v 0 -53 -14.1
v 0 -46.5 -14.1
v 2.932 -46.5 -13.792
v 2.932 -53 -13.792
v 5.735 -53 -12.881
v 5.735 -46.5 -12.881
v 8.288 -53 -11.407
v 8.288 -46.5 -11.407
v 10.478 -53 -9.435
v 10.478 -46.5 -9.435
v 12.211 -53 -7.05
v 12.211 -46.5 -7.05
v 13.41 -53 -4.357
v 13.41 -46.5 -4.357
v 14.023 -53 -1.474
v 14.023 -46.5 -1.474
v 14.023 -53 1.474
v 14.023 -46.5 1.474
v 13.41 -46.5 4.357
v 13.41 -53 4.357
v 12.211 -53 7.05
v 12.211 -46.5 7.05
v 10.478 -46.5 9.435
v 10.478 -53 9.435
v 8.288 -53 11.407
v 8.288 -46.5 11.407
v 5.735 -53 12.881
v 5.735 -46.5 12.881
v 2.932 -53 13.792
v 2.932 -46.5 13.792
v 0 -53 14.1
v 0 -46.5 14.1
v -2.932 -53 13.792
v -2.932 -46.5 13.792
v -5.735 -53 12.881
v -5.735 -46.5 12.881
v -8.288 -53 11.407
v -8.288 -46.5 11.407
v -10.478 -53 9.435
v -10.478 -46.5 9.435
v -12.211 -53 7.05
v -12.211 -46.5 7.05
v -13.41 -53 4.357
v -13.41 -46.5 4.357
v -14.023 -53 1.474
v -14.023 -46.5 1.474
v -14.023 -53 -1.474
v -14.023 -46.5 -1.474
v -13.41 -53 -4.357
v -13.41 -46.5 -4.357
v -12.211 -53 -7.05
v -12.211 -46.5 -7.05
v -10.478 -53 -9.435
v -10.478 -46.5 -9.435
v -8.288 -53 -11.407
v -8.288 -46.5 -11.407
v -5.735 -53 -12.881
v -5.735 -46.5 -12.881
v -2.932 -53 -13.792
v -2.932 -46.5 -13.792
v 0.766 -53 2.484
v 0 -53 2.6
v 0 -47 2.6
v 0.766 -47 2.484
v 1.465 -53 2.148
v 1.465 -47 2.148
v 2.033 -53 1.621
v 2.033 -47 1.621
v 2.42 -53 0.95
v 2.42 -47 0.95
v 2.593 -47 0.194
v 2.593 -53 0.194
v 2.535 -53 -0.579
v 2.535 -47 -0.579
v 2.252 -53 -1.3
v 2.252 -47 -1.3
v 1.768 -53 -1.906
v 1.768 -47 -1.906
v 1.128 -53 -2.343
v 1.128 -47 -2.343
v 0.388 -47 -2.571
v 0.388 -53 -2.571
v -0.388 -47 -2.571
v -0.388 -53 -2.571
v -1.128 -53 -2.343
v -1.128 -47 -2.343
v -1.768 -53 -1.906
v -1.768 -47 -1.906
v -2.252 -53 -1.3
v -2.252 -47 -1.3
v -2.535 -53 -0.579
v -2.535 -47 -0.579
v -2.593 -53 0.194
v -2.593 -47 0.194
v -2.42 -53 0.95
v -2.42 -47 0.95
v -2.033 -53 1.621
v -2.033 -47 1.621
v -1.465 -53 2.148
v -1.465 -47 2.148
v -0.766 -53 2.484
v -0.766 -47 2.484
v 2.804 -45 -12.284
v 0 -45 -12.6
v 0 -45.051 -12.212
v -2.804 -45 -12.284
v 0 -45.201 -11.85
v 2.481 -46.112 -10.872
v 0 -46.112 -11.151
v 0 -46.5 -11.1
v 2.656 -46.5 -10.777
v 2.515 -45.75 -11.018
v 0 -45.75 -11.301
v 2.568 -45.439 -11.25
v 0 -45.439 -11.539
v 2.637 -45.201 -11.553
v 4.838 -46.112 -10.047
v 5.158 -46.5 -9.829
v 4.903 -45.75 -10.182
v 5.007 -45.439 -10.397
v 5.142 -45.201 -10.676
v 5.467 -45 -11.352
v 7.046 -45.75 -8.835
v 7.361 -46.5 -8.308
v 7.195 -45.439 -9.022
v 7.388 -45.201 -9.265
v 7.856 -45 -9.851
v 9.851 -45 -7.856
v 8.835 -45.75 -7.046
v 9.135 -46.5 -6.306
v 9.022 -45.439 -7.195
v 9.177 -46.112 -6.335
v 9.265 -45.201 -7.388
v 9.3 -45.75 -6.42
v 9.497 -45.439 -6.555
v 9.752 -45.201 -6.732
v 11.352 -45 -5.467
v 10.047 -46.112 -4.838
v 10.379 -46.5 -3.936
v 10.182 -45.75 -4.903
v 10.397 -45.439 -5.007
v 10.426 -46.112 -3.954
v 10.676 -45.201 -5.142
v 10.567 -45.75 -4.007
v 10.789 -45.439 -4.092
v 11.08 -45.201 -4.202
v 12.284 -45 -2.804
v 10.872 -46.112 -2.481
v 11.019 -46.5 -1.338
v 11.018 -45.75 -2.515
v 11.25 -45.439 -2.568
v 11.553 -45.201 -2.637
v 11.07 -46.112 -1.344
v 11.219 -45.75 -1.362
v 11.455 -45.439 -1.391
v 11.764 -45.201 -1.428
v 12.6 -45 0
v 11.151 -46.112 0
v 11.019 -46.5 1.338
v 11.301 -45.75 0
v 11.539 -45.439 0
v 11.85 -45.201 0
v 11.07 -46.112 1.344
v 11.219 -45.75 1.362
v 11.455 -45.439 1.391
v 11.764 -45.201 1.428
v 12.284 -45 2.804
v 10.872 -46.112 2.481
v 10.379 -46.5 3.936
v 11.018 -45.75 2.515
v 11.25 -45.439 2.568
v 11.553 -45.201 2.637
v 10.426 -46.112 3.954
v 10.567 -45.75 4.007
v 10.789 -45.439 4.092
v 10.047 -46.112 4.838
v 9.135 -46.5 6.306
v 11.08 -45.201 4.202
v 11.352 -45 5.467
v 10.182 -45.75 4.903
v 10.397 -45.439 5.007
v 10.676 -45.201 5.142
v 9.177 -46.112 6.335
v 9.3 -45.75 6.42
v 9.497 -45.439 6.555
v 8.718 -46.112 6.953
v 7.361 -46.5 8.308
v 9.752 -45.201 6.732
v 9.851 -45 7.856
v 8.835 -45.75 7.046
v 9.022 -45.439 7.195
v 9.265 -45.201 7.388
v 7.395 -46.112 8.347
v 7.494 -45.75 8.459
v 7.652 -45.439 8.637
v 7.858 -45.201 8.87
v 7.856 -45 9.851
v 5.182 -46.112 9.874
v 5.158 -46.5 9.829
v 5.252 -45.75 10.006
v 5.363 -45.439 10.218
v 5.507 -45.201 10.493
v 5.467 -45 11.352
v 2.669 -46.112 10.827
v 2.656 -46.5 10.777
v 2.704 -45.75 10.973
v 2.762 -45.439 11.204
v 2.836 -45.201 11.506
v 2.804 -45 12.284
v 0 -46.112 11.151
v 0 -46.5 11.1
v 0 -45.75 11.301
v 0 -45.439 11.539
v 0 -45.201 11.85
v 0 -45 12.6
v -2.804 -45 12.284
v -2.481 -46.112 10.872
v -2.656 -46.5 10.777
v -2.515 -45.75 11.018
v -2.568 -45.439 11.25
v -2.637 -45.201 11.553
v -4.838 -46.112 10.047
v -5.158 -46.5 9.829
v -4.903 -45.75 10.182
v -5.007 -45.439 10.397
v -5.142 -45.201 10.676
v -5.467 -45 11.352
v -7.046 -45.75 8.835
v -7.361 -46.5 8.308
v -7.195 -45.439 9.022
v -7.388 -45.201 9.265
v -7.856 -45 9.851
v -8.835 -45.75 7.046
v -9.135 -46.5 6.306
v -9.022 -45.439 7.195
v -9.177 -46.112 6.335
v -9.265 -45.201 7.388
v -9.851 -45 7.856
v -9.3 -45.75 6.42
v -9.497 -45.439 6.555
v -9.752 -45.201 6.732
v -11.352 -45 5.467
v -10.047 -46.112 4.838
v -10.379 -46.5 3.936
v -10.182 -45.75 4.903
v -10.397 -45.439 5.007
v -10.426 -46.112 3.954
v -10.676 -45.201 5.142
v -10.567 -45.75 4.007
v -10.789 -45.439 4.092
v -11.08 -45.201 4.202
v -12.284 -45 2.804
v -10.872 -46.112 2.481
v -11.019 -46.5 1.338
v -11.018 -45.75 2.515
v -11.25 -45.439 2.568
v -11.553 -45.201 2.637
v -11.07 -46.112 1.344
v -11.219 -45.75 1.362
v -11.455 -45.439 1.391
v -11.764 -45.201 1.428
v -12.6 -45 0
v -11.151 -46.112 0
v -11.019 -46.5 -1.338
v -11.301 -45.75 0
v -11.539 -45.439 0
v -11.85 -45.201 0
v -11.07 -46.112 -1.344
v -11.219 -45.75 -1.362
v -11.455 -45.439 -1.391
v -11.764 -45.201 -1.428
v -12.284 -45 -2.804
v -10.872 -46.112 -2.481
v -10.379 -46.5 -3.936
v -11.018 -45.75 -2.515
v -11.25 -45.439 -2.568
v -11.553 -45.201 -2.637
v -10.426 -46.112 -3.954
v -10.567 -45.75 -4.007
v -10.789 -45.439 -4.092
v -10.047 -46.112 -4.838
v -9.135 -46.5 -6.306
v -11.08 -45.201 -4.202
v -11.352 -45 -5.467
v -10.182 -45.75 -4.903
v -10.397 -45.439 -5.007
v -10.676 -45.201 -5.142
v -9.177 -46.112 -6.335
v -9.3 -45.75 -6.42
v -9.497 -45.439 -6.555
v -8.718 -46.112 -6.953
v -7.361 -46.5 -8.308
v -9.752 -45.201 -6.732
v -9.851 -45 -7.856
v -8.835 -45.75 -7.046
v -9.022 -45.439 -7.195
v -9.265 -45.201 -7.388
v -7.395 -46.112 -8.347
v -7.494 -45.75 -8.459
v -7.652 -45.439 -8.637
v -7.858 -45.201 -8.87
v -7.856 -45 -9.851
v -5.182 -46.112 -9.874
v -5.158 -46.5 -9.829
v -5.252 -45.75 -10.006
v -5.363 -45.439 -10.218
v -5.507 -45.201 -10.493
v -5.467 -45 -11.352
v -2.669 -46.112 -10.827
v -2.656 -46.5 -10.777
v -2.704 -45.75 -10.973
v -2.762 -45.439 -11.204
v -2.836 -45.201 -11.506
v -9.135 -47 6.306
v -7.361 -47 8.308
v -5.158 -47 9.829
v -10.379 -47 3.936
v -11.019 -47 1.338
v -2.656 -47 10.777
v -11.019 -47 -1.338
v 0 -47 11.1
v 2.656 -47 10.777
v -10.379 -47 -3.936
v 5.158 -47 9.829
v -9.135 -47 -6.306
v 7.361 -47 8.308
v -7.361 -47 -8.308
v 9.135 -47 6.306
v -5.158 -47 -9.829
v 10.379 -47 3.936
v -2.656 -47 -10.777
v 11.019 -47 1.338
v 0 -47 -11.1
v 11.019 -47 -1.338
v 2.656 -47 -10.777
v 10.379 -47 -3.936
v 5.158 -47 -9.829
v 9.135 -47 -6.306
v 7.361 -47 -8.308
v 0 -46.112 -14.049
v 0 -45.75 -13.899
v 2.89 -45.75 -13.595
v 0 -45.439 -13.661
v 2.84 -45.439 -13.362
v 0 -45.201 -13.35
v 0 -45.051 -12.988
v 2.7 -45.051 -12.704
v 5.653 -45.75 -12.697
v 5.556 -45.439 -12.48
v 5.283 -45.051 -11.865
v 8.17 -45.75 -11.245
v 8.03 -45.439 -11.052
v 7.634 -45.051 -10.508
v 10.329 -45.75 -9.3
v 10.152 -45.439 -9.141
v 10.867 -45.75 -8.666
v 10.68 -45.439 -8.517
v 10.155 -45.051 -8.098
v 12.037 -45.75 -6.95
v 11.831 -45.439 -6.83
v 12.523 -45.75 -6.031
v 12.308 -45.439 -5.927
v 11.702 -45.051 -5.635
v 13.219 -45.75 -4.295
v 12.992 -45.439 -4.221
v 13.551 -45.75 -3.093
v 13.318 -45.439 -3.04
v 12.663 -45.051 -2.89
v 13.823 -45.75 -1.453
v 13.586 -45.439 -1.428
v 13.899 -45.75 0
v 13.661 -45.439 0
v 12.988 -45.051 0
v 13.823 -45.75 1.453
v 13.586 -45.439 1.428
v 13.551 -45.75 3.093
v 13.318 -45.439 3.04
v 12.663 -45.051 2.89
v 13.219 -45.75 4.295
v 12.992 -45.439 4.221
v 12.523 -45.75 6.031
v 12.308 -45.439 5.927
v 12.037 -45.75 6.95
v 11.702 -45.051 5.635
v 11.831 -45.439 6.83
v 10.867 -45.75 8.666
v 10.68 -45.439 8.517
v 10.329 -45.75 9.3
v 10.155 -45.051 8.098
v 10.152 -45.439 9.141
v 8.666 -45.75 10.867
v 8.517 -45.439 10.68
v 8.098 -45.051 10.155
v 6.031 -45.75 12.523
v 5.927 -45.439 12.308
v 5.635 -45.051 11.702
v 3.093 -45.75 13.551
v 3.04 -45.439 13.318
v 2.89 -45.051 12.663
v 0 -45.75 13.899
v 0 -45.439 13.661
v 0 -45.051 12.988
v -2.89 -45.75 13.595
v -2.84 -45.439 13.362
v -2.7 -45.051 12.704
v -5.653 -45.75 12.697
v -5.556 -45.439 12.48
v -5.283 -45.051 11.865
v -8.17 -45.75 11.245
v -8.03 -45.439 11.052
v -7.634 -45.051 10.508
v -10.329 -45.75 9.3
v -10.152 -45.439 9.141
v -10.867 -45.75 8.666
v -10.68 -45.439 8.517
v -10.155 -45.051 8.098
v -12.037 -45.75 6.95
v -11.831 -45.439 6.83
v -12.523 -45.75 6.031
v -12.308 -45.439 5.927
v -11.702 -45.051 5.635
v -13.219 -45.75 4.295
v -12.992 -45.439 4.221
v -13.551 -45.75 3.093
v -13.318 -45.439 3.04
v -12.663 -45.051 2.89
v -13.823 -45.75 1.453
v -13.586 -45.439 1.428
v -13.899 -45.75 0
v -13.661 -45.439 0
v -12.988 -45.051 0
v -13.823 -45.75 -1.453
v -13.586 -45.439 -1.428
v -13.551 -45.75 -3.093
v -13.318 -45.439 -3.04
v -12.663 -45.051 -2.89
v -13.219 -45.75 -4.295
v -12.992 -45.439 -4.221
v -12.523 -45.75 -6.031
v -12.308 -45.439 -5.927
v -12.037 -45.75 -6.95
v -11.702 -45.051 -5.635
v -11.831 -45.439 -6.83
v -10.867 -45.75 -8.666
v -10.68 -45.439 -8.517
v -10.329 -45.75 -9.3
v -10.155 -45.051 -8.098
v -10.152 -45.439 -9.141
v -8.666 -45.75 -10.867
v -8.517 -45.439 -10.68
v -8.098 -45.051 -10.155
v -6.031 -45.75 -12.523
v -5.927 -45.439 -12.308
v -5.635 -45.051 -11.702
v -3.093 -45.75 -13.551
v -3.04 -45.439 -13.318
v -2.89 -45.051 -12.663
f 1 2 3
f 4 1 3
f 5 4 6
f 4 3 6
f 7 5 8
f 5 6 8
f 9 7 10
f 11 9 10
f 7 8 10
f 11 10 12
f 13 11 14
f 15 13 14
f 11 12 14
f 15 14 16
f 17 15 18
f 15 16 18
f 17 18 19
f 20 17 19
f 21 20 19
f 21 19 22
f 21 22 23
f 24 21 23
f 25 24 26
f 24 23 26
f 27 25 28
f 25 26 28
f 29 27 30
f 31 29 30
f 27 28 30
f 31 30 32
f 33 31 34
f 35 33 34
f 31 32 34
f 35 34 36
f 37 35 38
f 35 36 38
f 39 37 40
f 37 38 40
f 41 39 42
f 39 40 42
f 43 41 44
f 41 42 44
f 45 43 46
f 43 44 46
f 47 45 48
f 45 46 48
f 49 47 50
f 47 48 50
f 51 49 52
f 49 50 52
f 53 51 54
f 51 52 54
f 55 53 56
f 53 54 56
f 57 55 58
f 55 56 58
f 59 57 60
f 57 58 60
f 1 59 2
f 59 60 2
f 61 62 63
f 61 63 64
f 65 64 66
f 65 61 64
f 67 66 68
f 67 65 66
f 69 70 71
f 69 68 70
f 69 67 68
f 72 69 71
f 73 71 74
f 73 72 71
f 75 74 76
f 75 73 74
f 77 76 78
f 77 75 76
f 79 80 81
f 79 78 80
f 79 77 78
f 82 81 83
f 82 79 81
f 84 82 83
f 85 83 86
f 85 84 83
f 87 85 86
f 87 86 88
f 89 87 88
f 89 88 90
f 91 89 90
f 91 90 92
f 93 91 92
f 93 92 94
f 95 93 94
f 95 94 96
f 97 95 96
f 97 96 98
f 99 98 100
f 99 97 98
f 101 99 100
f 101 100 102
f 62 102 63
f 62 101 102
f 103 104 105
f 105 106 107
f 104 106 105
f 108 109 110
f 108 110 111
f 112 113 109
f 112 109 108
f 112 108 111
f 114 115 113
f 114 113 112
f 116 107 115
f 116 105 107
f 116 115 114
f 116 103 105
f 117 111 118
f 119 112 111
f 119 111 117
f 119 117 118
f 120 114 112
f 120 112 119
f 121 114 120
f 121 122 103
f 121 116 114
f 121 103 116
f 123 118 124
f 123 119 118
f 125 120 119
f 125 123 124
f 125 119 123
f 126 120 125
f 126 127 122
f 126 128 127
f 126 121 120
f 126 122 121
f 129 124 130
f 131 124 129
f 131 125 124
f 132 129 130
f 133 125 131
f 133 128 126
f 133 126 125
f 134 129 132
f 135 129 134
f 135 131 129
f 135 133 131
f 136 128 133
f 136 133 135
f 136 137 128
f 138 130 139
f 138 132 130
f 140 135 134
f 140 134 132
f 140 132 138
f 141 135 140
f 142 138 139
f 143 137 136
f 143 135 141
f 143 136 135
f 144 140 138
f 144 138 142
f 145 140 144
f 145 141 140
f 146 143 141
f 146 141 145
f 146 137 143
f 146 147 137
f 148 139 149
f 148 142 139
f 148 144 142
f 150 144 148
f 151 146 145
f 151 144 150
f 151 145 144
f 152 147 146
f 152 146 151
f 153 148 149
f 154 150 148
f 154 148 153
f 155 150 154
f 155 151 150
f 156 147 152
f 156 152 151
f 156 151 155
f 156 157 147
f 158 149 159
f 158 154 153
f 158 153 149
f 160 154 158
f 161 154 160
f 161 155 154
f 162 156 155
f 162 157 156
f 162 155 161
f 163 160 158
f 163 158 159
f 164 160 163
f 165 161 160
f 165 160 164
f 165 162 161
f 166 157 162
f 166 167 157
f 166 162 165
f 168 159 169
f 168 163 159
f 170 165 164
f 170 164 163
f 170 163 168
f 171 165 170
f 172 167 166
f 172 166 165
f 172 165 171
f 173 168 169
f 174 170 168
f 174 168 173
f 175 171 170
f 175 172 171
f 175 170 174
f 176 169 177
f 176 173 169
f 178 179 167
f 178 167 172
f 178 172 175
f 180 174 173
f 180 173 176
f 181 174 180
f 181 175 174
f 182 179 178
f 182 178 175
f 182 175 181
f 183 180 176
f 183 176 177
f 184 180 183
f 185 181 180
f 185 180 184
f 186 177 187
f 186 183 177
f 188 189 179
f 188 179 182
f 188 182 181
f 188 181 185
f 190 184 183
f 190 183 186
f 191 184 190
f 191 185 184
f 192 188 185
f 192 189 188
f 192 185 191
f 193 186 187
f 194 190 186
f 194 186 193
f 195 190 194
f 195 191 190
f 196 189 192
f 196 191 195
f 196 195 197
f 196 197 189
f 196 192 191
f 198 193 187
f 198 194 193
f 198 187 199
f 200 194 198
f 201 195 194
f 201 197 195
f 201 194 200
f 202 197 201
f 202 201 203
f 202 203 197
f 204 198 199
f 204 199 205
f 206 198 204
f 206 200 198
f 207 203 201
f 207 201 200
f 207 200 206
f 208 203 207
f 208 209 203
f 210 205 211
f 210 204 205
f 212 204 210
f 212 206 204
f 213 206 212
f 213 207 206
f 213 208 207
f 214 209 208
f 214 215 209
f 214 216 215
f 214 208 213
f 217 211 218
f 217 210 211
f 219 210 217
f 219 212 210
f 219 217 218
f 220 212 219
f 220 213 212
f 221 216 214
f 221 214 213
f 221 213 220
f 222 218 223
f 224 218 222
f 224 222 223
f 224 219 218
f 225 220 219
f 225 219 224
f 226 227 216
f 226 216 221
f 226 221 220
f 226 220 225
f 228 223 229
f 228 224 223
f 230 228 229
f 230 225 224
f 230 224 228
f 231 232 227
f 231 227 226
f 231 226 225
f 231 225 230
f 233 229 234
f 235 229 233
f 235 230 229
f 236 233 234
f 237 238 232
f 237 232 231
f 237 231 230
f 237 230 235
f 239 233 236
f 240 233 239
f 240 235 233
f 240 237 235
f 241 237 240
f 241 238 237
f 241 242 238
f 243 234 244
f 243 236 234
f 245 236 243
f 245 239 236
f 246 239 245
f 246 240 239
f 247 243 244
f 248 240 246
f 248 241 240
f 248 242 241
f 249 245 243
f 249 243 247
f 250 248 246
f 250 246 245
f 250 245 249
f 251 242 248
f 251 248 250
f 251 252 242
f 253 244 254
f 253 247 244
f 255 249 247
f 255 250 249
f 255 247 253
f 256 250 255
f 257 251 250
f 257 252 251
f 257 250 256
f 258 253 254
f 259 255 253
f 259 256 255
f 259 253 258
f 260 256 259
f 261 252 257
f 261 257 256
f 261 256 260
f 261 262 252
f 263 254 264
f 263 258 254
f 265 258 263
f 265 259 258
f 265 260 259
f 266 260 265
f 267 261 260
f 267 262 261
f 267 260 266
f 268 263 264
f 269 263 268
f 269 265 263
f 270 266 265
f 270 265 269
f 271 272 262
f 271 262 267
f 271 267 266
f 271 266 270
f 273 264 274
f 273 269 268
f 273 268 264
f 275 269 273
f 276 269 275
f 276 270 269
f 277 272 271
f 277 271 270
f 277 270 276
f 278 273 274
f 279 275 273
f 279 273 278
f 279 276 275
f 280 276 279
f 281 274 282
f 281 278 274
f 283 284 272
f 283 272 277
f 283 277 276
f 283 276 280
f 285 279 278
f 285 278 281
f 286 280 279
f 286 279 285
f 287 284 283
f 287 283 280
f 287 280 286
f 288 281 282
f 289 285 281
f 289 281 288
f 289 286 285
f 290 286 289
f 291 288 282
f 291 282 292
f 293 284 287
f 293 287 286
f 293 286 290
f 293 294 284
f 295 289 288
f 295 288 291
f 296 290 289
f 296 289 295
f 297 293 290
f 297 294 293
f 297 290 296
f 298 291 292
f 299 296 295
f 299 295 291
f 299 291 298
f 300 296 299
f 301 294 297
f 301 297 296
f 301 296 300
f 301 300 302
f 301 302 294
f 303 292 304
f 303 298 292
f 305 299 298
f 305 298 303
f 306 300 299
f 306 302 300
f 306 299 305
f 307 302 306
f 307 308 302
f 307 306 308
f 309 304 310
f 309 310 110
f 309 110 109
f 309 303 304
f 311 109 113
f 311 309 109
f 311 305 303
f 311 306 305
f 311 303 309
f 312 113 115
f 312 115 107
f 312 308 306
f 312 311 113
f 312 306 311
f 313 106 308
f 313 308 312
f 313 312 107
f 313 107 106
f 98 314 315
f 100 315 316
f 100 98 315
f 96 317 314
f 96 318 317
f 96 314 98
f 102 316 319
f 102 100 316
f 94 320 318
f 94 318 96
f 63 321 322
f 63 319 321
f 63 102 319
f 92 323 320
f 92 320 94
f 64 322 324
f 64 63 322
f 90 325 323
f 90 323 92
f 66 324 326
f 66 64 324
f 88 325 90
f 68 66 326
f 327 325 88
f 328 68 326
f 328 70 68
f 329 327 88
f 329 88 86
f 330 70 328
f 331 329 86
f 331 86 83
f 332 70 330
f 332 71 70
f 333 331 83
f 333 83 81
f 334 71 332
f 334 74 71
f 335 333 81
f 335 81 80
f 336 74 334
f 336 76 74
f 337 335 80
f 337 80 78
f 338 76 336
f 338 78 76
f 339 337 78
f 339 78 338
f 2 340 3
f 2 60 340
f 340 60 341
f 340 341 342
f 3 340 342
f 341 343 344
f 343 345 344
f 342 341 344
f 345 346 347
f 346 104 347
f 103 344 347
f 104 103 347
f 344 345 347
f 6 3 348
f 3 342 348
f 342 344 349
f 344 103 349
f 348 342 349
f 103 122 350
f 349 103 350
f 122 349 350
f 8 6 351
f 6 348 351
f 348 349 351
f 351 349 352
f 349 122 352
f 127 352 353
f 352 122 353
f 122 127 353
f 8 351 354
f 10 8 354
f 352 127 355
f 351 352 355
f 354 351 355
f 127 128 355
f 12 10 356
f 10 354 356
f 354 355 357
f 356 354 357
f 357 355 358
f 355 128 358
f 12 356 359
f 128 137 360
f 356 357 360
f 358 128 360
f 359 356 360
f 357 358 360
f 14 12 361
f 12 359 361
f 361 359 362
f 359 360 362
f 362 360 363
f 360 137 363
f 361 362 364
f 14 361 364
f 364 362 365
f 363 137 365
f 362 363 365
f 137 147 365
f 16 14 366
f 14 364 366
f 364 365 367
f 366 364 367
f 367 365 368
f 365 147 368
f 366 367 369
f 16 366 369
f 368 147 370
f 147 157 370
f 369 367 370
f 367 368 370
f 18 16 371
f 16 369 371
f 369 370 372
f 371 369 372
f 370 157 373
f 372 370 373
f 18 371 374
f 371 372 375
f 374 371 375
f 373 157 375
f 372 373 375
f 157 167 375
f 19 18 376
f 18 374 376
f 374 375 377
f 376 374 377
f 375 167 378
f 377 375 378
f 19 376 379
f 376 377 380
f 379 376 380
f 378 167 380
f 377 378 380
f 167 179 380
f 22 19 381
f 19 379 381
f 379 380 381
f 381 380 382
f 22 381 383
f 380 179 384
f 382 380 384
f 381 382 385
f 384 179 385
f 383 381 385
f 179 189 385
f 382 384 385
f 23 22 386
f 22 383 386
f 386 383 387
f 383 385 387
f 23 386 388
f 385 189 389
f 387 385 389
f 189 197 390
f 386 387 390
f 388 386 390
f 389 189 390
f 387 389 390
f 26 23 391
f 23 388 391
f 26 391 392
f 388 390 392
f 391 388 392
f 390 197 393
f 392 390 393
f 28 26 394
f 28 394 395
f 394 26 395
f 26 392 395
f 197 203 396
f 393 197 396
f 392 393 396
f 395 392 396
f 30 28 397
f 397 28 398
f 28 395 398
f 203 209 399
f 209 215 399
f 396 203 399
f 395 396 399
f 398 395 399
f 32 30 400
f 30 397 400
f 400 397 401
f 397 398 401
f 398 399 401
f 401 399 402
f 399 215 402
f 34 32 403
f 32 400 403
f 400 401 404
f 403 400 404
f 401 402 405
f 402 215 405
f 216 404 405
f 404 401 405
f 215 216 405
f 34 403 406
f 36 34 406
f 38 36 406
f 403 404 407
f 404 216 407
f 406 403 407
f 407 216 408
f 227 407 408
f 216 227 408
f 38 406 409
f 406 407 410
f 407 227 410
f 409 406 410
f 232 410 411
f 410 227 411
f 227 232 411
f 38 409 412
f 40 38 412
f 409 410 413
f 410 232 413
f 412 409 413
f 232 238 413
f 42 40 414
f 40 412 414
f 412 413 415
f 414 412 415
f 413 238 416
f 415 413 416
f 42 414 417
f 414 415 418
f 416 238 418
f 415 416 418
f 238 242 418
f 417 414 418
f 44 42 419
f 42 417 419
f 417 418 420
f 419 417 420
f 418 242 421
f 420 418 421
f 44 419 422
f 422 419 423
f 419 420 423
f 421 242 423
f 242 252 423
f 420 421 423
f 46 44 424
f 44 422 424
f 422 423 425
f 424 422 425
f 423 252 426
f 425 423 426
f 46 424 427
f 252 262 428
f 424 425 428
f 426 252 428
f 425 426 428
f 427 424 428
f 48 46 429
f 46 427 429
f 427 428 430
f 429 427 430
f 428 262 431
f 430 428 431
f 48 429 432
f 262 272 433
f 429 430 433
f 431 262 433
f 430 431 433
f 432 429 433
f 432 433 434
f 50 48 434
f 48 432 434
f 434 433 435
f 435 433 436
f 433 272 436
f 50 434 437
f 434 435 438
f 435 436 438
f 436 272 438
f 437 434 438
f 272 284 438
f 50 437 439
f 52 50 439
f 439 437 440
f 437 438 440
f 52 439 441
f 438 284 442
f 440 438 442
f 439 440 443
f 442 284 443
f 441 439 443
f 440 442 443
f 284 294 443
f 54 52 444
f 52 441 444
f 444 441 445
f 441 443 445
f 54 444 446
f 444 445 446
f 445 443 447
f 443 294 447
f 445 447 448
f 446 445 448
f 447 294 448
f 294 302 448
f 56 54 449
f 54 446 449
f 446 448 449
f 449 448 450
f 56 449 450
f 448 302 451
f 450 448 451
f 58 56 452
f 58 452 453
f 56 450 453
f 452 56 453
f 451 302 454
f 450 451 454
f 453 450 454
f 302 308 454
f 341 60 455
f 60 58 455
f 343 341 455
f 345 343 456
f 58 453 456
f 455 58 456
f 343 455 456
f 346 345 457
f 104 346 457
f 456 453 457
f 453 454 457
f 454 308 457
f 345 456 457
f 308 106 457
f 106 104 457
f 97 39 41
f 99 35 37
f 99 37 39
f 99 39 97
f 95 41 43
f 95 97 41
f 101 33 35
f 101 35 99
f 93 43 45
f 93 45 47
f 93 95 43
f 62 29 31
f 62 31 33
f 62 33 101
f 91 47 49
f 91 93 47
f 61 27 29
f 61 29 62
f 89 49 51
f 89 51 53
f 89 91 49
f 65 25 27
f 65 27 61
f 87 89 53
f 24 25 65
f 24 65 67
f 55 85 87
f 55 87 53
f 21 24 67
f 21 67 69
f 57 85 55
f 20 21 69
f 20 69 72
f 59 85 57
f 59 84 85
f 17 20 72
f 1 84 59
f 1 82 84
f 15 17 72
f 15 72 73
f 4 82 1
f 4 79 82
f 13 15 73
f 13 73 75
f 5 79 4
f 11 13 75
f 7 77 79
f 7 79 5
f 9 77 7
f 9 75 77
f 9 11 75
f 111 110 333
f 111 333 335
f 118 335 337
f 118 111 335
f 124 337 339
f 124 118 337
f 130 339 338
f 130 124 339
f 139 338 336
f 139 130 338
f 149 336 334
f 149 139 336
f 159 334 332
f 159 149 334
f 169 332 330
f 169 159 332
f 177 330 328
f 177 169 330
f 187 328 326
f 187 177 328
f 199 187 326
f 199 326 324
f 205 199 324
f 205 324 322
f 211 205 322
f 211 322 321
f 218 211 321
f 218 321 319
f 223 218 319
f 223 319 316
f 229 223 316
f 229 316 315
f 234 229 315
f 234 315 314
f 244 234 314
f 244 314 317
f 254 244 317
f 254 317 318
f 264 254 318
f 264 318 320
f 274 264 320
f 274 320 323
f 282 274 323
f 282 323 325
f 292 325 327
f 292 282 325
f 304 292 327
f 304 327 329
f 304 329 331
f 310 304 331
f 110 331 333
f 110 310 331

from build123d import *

# Parameters (mm, degrees)
SKETCH1_R               = 11.1
SKETCH1_R_2             = 8.1
BOSS_EXTRUDE1_DEPTH     = 50
SKETCH3_W               = 203.170281232
SKETCH3_H               = 205.602397066
CUT_EXTRUDE1_DEPTH      = 53.406297332
SKETCH4_R               = 11.1
BOSS_EXTRUDE3_DEPTH     = 3
CUT_EXTRUDE2_DEPTH      = 99.261996723
CUT_EXTRUDE2_DEPTH_BACK = 99.261996723
SKETCH5_R               = 2.6
SKETCH6_W               = 15
SKETCH6_H               = 30
BOSS_EXTRUDE4_DEPTH     = 1.5
CUT_EXTRUDE3_DEPTH      = 60.691875494
CUT_EXTRUDE3_DEPTH_BACK = 60.691875494
SKETCH7_W               = 115.313009773
SKETCH7_H               = 104.745429411
BOSS_EXTRUDE5_START     = -8
SKETCH8_R               = 14.1
SKETCH8_R_2             = 11.1
BOSS_EXTRUDE5_DEPTH     = 8
FILLET3_R               = 1.5


with BuildPart() as part:
    # Sketch1 → Boss-Extrude1 (new, symmetric)
    with BuildSketch(Plane(origin=(0, 0, 0), x_dir=(1, 0, 0), z_dir=(0, 1, 0))):
        with Locations(Location((0, 0, 0), (0, 0, 270))):
            Circle(SKETCH1_R)
        with Locations(Location((0, 0, 0), (0, 0, 270))):
            Circle(SKETCH1_R_2, mode=Mode.SUBTRACT)
    extrude(amount=BOSS_EXTRUDE1_DEPTH, both=True)

    # Sketch3 → Cut-Extrude1 (cut, through all)
    with BuildSketch(Plane.XY):
        Rectangle(SKETCH3_W, SKETCH3_H)
    extrude(amount=CUT_EXTRUDE1_DEPTH, mode=Mode.SUBTRACT)

    # Sketch4 → Boss-Extrude3 (add, symmetric)
    with BuildSketch(Plane.XZ.offset(50)):
        with Locations(Location((0, 0, 0), (0, 0, 270))):
            Circle(SKETCH4_R)
    extrude(amount=BOSS_EXTRUDE3_DEPTH, both=True)

    # Sketch5 → Cut-Extrude2 (cut, two sides: drawn at the far end of the back side and taken through both)
    with BuildSketch(Plane(origin=(0, -47, 0), x_dir=(1, 0, 0), z_dir=(0, 1, 0)).offset(-CUT_EXTRUDE2_DEPTH_BACK)):
        with Locations(Location((0, 0, 0), (0, 0, 270))):
            Circle(SKETCH5_R)
    extrude(amount=CUT_EXTRUDE2_DEPTH + CUT_EXTRUDE2_DEPTH_BACK, mode=Mode.SUBTRACT)

    # Sketch6 → Boss-Extrude4 (add, symmetric)
    with BuildSketch(Plane.XY.offset(-6)):
        with Locations((15.1, 25)):
            Rectangle(SKETCH6_W, SKETCH6_H)
        with Locations((-15.1, 25)):
            Rectangle(SKETCH6_W, SKETCH6_H)
    extrude(amount=BOSS_EXTRUDE4_DEPTH, both=True)

    # Sketch7 → Cut-Extrude3 (cut, two sides: drawn at the far end of the back side and taken through both)
    with BuildSketch(Plane.XY.offset(-4.5).offset(-CUT_EXTRUDE3_DEPTH_BACK)):
        with Locations((3.022672806, 5.372714706)):
            Rectangle(SKETCH7_W, SKETCH7_H)
    extrude(amount=CUT_EXTRUDE3_DEPTH + CUT_EXTRUDE3_DEPTH_BACK, mode=Mode.SUBTRACT)

    # Sketch8 → Boss-Extrude5 (add)
    with BuildSketch(Plane.XZ.offset(53).offset(BOSS_EXTRUDE5_START)):
        with Locations(Location((0, 0, 0), (0, 0, 270))):
            Circle(SKETCH8_R)
        with Locations(Location((0, 0, 0), (0, 0, 270))):
            Circle(SKETCH8_R_2, mode=Mode.SUBTRACT)
    extrude(amount=BOSS_EXTRUDE5_DEPTH)

    # Fillet3
    fillet3_edges = [part.edges().sort_by_distance(p)[0] for p in [
        (0, -45, 14.1),
        (0, -45, 11.1),
    ]]
    fillet(fillet3_edges, radius=FILLET3_R - 0.0001)  # a hair under: the kernel refuses the full size


solid = part.part
